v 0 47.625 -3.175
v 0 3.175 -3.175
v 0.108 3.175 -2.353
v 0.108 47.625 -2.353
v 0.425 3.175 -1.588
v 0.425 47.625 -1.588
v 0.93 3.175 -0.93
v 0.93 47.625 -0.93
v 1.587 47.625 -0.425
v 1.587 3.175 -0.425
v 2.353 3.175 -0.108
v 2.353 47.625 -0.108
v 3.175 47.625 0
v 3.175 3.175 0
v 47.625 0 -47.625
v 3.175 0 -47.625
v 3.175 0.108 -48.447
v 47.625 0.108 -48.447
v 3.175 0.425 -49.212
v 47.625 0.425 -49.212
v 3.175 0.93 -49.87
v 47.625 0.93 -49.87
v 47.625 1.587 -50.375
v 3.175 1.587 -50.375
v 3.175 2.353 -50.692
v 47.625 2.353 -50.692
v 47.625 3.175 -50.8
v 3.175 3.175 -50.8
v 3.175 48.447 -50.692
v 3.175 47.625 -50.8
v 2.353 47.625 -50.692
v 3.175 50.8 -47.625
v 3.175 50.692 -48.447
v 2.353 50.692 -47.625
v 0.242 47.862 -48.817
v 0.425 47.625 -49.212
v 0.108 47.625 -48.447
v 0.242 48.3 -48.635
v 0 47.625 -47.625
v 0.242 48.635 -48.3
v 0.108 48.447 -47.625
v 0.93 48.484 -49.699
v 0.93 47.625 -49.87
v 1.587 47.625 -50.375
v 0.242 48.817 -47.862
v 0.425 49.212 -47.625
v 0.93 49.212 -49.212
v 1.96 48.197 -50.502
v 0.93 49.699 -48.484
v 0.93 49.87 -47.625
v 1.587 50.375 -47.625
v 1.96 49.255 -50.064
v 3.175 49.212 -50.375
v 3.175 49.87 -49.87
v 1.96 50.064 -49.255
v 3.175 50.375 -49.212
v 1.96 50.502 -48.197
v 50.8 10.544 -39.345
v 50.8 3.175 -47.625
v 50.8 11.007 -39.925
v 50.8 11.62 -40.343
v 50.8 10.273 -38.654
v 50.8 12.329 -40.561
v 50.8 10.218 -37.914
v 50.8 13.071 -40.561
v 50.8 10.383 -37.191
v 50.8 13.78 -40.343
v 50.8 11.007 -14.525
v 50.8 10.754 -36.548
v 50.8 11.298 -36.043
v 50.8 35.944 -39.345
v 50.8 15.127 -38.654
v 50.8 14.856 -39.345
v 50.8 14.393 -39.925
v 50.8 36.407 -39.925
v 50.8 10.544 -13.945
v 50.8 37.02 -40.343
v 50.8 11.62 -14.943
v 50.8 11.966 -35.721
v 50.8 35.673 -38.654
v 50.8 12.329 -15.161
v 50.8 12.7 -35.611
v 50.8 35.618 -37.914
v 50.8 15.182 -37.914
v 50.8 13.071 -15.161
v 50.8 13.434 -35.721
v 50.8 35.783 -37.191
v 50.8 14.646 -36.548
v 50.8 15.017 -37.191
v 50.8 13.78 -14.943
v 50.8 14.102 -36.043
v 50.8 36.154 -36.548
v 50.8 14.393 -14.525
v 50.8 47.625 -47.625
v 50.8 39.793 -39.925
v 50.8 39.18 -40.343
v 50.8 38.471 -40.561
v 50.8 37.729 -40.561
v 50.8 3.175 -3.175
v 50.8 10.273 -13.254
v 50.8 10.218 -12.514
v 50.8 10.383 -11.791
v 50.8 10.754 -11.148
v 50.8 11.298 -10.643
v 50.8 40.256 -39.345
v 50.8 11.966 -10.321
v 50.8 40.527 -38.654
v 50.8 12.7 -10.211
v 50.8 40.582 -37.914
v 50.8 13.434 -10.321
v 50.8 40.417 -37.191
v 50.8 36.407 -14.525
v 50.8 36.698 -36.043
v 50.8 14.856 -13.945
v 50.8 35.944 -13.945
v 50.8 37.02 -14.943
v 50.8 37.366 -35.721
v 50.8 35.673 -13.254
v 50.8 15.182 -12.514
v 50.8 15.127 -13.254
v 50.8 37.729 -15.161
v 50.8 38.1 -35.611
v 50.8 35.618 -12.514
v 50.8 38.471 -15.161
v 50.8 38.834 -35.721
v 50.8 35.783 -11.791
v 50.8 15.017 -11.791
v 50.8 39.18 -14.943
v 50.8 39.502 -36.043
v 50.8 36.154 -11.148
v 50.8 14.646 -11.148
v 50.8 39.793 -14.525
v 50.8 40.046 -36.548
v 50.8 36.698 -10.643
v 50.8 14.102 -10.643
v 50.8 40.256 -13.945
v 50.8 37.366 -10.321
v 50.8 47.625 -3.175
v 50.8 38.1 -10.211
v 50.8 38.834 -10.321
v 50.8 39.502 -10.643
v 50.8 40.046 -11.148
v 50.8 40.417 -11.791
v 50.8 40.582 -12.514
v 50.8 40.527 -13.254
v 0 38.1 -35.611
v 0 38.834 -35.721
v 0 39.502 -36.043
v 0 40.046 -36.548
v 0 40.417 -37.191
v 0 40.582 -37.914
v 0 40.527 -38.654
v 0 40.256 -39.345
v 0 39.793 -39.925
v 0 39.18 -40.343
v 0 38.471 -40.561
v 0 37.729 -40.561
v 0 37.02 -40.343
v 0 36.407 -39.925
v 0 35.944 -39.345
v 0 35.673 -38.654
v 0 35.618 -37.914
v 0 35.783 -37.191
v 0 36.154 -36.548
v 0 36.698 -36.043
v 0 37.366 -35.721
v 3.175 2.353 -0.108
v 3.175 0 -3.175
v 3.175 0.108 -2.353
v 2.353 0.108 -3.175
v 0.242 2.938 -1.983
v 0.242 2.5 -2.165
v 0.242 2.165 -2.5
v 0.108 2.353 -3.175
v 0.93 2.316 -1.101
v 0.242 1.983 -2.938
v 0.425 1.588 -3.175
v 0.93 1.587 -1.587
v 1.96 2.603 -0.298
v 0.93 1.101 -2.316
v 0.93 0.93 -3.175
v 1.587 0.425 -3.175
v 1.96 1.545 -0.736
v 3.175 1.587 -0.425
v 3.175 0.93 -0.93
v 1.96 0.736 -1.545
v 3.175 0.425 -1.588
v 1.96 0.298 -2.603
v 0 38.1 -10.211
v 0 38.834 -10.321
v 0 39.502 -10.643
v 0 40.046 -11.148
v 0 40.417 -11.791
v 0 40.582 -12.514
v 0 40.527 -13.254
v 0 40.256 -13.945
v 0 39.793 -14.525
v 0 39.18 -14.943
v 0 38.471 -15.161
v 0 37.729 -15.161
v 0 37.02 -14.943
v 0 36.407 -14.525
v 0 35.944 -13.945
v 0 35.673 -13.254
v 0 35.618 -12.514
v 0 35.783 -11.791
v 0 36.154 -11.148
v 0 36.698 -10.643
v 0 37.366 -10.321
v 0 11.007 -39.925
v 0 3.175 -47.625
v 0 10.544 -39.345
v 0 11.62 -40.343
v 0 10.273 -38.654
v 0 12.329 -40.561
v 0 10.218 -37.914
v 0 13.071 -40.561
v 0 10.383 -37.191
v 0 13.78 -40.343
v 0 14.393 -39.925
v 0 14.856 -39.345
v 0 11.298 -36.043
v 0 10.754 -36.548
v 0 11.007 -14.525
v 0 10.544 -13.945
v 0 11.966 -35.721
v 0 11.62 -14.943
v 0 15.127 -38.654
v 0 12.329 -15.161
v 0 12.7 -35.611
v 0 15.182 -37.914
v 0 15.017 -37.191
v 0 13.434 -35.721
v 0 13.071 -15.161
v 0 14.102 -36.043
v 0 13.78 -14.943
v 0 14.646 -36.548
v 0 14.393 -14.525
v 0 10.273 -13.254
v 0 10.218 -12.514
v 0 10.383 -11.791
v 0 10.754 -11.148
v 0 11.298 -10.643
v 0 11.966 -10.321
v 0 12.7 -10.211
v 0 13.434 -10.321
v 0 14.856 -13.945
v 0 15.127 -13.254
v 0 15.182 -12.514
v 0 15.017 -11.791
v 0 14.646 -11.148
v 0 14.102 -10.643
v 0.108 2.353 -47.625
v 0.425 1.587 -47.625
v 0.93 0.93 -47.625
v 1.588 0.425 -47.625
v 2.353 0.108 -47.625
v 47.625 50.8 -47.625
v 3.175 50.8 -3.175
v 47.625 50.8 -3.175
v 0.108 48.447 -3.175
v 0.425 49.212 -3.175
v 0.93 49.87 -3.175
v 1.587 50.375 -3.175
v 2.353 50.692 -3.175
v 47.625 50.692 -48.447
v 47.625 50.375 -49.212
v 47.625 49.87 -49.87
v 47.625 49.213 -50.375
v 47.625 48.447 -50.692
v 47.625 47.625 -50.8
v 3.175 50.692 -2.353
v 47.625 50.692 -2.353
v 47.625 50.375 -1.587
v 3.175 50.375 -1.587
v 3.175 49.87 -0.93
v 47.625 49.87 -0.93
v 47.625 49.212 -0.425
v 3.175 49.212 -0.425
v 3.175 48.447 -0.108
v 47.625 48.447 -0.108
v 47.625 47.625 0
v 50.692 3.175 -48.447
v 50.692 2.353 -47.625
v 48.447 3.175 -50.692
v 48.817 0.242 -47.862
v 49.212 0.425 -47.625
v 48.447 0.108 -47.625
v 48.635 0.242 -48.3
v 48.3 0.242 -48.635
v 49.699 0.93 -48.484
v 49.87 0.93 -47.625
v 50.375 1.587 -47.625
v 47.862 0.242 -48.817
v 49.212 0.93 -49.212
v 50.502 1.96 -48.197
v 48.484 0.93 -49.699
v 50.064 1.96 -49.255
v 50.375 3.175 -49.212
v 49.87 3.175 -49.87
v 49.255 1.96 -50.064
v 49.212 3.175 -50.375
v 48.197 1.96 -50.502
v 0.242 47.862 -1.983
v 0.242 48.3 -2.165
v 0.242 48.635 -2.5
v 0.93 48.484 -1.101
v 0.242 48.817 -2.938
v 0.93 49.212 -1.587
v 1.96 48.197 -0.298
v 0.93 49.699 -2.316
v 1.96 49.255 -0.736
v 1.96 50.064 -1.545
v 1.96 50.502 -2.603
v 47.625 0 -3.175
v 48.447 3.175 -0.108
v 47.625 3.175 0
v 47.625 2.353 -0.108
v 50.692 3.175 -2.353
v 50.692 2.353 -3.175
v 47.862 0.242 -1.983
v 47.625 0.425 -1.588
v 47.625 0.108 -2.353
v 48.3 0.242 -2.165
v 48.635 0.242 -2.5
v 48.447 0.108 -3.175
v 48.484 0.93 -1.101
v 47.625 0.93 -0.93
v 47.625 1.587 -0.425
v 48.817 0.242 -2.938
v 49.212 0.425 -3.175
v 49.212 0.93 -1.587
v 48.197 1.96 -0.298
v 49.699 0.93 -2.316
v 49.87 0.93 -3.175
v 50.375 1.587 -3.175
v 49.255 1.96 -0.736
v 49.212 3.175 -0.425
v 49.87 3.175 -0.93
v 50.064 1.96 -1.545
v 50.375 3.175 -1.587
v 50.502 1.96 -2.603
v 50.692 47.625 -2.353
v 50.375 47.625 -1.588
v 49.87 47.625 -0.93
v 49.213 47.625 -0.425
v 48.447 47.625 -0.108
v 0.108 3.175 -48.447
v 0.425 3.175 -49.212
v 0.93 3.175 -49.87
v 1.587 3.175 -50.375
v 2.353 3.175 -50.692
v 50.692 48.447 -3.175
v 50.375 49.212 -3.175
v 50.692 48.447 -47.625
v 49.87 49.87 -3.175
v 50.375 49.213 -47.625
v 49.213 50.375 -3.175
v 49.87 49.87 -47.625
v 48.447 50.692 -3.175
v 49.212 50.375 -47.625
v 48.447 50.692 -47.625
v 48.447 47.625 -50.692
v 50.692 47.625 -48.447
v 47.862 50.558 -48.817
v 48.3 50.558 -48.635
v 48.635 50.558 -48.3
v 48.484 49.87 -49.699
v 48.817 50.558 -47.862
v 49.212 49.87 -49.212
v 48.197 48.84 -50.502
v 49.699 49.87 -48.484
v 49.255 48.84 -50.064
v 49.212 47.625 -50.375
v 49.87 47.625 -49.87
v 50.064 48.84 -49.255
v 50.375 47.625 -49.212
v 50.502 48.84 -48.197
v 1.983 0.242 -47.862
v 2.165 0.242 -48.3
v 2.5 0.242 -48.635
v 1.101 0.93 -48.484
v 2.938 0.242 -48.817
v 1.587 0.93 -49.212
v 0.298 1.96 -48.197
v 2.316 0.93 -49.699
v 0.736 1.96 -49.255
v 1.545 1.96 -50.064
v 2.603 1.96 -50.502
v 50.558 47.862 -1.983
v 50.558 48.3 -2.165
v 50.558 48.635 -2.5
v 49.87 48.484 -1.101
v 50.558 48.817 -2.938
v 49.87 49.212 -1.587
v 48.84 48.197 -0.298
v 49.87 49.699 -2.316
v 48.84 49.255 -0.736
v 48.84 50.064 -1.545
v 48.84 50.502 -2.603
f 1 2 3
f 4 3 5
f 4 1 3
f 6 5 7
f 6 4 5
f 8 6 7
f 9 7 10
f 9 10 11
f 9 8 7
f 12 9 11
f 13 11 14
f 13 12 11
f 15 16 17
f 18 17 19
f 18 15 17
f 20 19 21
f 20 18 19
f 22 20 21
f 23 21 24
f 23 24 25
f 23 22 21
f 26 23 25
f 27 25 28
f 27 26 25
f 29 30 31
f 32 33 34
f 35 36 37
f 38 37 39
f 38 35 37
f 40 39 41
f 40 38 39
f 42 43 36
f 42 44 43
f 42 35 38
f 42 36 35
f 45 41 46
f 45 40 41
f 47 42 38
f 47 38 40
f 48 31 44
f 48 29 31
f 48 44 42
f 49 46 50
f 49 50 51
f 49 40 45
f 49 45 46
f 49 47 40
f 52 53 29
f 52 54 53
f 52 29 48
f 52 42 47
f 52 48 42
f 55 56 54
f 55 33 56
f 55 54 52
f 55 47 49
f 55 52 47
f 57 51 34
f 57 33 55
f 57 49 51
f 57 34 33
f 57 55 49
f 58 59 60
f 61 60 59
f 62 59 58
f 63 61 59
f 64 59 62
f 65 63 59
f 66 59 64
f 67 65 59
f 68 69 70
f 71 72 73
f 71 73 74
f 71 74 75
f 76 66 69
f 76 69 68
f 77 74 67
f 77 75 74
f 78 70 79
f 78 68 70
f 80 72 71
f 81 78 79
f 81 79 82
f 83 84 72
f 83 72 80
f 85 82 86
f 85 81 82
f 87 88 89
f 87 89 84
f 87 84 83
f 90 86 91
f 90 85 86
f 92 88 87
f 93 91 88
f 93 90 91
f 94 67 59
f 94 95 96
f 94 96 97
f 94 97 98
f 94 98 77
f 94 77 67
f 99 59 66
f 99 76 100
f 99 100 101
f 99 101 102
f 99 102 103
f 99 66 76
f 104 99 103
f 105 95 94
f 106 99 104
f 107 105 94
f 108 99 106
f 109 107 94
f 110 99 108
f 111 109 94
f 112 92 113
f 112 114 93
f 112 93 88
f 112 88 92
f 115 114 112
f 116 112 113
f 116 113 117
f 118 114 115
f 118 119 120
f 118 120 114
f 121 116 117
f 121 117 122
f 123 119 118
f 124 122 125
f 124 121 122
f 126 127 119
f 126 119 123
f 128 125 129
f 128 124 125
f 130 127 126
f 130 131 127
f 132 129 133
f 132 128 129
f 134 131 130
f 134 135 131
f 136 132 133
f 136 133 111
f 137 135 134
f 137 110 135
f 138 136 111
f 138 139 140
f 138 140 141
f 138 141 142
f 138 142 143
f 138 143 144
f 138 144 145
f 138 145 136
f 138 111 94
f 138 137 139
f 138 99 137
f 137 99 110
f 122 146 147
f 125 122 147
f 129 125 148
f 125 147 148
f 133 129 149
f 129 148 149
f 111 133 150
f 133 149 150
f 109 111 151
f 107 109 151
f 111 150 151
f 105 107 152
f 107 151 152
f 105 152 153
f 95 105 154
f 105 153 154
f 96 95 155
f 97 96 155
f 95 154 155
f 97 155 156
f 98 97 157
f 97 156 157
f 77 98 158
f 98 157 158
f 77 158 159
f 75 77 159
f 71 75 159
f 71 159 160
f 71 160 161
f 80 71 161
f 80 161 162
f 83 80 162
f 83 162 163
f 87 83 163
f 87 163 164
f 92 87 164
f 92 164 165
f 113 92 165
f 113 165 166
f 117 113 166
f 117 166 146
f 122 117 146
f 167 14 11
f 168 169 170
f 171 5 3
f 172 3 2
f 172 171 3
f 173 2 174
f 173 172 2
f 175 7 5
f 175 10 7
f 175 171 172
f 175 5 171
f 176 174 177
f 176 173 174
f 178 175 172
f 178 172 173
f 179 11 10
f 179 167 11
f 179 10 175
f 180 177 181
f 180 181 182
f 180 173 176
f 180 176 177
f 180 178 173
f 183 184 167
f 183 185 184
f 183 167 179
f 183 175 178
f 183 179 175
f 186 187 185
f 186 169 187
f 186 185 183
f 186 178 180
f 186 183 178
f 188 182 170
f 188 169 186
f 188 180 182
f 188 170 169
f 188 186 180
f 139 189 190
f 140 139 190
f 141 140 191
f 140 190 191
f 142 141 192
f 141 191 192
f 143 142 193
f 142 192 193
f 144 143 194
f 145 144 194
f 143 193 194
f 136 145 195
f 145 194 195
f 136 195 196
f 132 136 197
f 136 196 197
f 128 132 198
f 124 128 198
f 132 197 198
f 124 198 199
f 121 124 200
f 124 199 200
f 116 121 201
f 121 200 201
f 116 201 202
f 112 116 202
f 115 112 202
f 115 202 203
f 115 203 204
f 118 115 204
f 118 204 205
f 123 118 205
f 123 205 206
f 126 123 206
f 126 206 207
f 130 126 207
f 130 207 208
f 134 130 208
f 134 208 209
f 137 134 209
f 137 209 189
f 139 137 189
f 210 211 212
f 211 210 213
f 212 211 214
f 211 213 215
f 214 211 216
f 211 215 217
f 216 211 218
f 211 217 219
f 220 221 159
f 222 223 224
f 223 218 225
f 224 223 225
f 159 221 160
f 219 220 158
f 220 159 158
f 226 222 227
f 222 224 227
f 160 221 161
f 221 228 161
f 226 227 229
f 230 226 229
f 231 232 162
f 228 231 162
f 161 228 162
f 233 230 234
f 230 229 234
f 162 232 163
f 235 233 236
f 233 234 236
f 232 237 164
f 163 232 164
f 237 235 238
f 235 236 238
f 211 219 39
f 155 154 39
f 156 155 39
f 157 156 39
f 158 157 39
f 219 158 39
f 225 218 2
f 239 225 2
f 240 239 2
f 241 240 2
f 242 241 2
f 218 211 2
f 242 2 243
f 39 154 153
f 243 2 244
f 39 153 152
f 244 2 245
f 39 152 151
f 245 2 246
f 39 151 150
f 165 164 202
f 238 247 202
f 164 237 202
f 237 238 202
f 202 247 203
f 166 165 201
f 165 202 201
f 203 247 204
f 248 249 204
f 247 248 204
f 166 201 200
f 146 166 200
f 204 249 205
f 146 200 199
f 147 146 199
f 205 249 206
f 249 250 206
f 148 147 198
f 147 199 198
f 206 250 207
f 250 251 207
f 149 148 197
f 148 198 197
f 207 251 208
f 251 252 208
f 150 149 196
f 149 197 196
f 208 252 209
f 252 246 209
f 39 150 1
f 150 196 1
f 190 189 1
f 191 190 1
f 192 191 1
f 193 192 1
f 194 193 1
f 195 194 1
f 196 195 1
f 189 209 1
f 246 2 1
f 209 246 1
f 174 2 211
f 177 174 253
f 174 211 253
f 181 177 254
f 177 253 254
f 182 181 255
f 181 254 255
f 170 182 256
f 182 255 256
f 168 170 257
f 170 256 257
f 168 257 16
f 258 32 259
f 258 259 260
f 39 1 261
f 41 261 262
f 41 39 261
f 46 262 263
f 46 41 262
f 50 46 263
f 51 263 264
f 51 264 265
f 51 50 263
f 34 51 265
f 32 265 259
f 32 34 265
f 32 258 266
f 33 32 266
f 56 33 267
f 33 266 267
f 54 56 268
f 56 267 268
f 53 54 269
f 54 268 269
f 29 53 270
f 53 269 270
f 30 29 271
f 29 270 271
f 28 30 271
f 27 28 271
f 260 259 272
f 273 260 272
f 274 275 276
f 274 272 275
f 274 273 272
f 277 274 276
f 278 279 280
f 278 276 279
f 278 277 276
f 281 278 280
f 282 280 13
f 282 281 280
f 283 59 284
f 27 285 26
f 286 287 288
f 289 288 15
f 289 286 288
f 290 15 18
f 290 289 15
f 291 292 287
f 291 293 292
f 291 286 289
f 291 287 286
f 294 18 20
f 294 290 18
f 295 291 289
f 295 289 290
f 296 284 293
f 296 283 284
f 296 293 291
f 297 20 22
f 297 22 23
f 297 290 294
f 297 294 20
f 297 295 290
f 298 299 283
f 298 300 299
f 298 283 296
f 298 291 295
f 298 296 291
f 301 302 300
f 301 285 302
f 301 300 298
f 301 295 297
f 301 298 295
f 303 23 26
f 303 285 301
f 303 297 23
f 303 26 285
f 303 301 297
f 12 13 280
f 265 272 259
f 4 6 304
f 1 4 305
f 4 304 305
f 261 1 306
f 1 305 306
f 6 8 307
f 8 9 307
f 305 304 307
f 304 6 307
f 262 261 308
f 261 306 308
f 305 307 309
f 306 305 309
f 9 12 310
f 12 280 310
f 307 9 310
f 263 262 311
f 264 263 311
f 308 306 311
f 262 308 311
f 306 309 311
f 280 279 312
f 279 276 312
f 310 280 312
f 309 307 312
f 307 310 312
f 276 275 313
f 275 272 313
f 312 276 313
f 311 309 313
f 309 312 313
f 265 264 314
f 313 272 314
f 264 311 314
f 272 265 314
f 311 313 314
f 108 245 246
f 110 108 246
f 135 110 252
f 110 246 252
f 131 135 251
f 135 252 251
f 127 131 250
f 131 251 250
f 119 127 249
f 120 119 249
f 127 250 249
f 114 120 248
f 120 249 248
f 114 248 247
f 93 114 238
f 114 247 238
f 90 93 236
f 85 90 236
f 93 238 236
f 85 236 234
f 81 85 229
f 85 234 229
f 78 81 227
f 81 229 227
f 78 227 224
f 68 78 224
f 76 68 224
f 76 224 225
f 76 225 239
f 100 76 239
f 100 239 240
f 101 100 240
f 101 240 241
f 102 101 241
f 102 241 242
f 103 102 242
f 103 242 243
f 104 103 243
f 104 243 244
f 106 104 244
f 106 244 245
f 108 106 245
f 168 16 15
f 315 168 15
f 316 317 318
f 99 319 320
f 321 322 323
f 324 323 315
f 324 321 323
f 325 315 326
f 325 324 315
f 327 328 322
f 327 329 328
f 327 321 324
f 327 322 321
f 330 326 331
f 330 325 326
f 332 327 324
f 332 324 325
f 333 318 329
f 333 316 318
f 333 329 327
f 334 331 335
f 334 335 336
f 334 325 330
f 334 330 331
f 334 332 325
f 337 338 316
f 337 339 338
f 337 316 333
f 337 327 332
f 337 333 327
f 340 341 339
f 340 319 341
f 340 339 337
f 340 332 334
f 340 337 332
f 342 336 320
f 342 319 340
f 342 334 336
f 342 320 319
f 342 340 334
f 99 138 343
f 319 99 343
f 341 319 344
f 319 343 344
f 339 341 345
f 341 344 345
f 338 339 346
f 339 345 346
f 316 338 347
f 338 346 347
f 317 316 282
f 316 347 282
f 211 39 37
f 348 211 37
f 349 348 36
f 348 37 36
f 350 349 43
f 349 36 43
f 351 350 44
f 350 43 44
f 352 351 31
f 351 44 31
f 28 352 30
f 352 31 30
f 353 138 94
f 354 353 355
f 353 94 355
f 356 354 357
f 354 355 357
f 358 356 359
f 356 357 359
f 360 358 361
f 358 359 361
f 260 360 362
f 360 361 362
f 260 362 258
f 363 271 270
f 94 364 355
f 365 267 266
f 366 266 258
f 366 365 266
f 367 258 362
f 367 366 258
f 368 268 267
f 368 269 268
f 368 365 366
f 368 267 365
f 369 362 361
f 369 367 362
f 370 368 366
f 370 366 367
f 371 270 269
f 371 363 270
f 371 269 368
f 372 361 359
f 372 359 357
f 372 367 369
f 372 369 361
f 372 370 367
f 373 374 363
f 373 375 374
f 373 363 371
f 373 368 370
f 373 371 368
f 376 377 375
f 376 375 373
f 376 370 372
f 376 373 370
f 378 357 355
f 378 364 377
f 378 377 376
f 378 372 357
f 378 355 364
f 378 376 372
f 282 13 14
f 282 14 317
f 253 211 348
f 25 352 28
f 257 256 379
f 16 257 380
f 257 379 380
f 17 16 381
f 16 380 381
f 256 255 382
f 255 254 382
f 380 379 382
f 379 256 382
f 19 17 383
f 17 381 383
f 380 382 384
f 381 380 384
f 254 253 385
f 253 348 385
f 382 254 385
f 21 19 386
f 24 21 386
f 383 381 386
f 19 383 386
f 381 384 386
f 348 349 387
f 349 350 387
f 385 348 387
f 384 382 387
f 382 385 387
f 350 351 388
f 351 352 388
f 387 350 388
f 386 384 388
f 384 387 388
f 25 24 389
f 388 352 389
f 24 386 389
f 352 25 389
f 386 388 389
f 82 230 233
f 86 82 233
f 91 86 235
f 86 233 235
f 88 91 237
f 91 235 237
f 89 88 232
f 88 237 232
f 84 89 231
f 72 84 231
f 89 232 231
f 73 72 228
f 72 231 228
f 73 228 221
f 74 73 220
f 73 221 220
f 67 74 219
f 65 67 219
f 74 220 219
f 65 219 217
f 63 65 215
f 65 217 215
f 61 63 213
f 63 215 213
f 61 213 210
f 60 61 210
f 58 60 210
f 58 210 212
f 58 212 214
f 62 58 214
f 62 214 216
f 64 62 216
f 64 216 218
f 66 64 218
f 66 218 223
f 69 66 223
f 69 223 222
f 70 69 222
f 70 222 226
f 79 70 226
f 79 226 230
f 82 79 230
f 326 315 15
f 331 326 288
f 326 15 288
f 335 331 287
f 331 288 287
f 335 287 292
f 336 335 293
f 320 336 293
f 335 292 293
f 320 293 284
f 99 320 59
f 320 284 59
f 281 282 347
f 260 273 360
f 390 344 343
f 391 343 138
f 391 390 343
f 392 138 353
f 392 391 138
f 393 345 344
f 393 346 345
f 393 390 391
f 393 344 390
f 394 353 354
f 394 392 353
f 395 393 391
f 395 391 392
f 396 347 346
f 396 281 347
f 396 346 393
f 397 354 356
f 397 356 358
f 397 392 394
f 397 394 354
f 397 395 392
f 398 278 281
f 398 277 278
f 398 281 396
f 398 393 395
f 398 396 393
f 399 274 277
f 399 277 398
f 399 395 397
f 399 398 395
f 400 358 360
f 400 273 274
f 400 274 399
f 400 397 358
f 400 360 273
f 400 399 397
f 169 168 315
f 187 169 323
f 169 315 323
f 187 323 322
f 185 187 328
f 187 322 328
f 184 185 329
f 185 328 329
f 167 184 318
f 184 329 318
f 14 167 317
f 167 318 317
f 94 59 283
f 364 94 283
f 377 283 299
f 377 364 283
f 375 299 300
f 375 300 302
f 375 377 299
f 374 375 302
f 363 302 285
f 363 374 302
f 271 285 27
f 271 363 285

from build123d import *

# Parameters (mm, degrees)
SKETCH1_W           = 50.8
SKETCH1_H           = 50.8
BOSS_EXTRUDE1_DEPTH = 50.8
FILLET1_R           = 3.175
SKETCH2_R           = 2.4892
CUT_EXTRUDE1_DEPTH  = 88.988181024


with BuildPart() as part:
    # Sketch1 → Boss-Extrude1 (new body)
    with BuildSketch(Plane.XY):
        with Locations((25.4, 25.4)):
            Rectangle(SKETCH1_W, SKETCH1_H)
    extrude(amount=-BOSS_EXTRUDE1_DEPTH)

    # Fillet1
    fillet1_edges = [part.edges().sort_by_distance(p)[0] for p in [
        (50.8, 25.4, -50.8),
        (25.4, 50.8, -50.8),
        (0, 25.4, -50.8),
        (25.4, 50.8, 0),
        (50.8, 25.4, 0),
        (25.4, 0, 0),
        (0, 25.4, 0),
        (0, 50.8, -25.4),
        (50.8, 50.8, -25.4),
        (50.8, 0, -25.4),
        (0, 0, -25.4),
        (25.4, 0, -50.8),
    ]]
    fillet(fillet1_edges, radius=FILLET1_R)

    # Sketch2 → Cut-Extrude1 (cut, through all)
    with BuildSketch(Plane.ZY):
        with Locations((-38.1, 12.7)):
            Circle(SKETCH2_R)
        with Locations((-12.7, 12.7)):
            Circle(SKETCH2_R)
        with Locations((-12.7, 38.1)):
            Circle(SKETCH2_R)
        with Locations((-38.1, 38.1)):
            Circle(SKETCH2_R)
    extrude(amount=-CUT_EXTRUDE1_DEPTH, mode=Mode.SUBTRACT)


solid = part.part
